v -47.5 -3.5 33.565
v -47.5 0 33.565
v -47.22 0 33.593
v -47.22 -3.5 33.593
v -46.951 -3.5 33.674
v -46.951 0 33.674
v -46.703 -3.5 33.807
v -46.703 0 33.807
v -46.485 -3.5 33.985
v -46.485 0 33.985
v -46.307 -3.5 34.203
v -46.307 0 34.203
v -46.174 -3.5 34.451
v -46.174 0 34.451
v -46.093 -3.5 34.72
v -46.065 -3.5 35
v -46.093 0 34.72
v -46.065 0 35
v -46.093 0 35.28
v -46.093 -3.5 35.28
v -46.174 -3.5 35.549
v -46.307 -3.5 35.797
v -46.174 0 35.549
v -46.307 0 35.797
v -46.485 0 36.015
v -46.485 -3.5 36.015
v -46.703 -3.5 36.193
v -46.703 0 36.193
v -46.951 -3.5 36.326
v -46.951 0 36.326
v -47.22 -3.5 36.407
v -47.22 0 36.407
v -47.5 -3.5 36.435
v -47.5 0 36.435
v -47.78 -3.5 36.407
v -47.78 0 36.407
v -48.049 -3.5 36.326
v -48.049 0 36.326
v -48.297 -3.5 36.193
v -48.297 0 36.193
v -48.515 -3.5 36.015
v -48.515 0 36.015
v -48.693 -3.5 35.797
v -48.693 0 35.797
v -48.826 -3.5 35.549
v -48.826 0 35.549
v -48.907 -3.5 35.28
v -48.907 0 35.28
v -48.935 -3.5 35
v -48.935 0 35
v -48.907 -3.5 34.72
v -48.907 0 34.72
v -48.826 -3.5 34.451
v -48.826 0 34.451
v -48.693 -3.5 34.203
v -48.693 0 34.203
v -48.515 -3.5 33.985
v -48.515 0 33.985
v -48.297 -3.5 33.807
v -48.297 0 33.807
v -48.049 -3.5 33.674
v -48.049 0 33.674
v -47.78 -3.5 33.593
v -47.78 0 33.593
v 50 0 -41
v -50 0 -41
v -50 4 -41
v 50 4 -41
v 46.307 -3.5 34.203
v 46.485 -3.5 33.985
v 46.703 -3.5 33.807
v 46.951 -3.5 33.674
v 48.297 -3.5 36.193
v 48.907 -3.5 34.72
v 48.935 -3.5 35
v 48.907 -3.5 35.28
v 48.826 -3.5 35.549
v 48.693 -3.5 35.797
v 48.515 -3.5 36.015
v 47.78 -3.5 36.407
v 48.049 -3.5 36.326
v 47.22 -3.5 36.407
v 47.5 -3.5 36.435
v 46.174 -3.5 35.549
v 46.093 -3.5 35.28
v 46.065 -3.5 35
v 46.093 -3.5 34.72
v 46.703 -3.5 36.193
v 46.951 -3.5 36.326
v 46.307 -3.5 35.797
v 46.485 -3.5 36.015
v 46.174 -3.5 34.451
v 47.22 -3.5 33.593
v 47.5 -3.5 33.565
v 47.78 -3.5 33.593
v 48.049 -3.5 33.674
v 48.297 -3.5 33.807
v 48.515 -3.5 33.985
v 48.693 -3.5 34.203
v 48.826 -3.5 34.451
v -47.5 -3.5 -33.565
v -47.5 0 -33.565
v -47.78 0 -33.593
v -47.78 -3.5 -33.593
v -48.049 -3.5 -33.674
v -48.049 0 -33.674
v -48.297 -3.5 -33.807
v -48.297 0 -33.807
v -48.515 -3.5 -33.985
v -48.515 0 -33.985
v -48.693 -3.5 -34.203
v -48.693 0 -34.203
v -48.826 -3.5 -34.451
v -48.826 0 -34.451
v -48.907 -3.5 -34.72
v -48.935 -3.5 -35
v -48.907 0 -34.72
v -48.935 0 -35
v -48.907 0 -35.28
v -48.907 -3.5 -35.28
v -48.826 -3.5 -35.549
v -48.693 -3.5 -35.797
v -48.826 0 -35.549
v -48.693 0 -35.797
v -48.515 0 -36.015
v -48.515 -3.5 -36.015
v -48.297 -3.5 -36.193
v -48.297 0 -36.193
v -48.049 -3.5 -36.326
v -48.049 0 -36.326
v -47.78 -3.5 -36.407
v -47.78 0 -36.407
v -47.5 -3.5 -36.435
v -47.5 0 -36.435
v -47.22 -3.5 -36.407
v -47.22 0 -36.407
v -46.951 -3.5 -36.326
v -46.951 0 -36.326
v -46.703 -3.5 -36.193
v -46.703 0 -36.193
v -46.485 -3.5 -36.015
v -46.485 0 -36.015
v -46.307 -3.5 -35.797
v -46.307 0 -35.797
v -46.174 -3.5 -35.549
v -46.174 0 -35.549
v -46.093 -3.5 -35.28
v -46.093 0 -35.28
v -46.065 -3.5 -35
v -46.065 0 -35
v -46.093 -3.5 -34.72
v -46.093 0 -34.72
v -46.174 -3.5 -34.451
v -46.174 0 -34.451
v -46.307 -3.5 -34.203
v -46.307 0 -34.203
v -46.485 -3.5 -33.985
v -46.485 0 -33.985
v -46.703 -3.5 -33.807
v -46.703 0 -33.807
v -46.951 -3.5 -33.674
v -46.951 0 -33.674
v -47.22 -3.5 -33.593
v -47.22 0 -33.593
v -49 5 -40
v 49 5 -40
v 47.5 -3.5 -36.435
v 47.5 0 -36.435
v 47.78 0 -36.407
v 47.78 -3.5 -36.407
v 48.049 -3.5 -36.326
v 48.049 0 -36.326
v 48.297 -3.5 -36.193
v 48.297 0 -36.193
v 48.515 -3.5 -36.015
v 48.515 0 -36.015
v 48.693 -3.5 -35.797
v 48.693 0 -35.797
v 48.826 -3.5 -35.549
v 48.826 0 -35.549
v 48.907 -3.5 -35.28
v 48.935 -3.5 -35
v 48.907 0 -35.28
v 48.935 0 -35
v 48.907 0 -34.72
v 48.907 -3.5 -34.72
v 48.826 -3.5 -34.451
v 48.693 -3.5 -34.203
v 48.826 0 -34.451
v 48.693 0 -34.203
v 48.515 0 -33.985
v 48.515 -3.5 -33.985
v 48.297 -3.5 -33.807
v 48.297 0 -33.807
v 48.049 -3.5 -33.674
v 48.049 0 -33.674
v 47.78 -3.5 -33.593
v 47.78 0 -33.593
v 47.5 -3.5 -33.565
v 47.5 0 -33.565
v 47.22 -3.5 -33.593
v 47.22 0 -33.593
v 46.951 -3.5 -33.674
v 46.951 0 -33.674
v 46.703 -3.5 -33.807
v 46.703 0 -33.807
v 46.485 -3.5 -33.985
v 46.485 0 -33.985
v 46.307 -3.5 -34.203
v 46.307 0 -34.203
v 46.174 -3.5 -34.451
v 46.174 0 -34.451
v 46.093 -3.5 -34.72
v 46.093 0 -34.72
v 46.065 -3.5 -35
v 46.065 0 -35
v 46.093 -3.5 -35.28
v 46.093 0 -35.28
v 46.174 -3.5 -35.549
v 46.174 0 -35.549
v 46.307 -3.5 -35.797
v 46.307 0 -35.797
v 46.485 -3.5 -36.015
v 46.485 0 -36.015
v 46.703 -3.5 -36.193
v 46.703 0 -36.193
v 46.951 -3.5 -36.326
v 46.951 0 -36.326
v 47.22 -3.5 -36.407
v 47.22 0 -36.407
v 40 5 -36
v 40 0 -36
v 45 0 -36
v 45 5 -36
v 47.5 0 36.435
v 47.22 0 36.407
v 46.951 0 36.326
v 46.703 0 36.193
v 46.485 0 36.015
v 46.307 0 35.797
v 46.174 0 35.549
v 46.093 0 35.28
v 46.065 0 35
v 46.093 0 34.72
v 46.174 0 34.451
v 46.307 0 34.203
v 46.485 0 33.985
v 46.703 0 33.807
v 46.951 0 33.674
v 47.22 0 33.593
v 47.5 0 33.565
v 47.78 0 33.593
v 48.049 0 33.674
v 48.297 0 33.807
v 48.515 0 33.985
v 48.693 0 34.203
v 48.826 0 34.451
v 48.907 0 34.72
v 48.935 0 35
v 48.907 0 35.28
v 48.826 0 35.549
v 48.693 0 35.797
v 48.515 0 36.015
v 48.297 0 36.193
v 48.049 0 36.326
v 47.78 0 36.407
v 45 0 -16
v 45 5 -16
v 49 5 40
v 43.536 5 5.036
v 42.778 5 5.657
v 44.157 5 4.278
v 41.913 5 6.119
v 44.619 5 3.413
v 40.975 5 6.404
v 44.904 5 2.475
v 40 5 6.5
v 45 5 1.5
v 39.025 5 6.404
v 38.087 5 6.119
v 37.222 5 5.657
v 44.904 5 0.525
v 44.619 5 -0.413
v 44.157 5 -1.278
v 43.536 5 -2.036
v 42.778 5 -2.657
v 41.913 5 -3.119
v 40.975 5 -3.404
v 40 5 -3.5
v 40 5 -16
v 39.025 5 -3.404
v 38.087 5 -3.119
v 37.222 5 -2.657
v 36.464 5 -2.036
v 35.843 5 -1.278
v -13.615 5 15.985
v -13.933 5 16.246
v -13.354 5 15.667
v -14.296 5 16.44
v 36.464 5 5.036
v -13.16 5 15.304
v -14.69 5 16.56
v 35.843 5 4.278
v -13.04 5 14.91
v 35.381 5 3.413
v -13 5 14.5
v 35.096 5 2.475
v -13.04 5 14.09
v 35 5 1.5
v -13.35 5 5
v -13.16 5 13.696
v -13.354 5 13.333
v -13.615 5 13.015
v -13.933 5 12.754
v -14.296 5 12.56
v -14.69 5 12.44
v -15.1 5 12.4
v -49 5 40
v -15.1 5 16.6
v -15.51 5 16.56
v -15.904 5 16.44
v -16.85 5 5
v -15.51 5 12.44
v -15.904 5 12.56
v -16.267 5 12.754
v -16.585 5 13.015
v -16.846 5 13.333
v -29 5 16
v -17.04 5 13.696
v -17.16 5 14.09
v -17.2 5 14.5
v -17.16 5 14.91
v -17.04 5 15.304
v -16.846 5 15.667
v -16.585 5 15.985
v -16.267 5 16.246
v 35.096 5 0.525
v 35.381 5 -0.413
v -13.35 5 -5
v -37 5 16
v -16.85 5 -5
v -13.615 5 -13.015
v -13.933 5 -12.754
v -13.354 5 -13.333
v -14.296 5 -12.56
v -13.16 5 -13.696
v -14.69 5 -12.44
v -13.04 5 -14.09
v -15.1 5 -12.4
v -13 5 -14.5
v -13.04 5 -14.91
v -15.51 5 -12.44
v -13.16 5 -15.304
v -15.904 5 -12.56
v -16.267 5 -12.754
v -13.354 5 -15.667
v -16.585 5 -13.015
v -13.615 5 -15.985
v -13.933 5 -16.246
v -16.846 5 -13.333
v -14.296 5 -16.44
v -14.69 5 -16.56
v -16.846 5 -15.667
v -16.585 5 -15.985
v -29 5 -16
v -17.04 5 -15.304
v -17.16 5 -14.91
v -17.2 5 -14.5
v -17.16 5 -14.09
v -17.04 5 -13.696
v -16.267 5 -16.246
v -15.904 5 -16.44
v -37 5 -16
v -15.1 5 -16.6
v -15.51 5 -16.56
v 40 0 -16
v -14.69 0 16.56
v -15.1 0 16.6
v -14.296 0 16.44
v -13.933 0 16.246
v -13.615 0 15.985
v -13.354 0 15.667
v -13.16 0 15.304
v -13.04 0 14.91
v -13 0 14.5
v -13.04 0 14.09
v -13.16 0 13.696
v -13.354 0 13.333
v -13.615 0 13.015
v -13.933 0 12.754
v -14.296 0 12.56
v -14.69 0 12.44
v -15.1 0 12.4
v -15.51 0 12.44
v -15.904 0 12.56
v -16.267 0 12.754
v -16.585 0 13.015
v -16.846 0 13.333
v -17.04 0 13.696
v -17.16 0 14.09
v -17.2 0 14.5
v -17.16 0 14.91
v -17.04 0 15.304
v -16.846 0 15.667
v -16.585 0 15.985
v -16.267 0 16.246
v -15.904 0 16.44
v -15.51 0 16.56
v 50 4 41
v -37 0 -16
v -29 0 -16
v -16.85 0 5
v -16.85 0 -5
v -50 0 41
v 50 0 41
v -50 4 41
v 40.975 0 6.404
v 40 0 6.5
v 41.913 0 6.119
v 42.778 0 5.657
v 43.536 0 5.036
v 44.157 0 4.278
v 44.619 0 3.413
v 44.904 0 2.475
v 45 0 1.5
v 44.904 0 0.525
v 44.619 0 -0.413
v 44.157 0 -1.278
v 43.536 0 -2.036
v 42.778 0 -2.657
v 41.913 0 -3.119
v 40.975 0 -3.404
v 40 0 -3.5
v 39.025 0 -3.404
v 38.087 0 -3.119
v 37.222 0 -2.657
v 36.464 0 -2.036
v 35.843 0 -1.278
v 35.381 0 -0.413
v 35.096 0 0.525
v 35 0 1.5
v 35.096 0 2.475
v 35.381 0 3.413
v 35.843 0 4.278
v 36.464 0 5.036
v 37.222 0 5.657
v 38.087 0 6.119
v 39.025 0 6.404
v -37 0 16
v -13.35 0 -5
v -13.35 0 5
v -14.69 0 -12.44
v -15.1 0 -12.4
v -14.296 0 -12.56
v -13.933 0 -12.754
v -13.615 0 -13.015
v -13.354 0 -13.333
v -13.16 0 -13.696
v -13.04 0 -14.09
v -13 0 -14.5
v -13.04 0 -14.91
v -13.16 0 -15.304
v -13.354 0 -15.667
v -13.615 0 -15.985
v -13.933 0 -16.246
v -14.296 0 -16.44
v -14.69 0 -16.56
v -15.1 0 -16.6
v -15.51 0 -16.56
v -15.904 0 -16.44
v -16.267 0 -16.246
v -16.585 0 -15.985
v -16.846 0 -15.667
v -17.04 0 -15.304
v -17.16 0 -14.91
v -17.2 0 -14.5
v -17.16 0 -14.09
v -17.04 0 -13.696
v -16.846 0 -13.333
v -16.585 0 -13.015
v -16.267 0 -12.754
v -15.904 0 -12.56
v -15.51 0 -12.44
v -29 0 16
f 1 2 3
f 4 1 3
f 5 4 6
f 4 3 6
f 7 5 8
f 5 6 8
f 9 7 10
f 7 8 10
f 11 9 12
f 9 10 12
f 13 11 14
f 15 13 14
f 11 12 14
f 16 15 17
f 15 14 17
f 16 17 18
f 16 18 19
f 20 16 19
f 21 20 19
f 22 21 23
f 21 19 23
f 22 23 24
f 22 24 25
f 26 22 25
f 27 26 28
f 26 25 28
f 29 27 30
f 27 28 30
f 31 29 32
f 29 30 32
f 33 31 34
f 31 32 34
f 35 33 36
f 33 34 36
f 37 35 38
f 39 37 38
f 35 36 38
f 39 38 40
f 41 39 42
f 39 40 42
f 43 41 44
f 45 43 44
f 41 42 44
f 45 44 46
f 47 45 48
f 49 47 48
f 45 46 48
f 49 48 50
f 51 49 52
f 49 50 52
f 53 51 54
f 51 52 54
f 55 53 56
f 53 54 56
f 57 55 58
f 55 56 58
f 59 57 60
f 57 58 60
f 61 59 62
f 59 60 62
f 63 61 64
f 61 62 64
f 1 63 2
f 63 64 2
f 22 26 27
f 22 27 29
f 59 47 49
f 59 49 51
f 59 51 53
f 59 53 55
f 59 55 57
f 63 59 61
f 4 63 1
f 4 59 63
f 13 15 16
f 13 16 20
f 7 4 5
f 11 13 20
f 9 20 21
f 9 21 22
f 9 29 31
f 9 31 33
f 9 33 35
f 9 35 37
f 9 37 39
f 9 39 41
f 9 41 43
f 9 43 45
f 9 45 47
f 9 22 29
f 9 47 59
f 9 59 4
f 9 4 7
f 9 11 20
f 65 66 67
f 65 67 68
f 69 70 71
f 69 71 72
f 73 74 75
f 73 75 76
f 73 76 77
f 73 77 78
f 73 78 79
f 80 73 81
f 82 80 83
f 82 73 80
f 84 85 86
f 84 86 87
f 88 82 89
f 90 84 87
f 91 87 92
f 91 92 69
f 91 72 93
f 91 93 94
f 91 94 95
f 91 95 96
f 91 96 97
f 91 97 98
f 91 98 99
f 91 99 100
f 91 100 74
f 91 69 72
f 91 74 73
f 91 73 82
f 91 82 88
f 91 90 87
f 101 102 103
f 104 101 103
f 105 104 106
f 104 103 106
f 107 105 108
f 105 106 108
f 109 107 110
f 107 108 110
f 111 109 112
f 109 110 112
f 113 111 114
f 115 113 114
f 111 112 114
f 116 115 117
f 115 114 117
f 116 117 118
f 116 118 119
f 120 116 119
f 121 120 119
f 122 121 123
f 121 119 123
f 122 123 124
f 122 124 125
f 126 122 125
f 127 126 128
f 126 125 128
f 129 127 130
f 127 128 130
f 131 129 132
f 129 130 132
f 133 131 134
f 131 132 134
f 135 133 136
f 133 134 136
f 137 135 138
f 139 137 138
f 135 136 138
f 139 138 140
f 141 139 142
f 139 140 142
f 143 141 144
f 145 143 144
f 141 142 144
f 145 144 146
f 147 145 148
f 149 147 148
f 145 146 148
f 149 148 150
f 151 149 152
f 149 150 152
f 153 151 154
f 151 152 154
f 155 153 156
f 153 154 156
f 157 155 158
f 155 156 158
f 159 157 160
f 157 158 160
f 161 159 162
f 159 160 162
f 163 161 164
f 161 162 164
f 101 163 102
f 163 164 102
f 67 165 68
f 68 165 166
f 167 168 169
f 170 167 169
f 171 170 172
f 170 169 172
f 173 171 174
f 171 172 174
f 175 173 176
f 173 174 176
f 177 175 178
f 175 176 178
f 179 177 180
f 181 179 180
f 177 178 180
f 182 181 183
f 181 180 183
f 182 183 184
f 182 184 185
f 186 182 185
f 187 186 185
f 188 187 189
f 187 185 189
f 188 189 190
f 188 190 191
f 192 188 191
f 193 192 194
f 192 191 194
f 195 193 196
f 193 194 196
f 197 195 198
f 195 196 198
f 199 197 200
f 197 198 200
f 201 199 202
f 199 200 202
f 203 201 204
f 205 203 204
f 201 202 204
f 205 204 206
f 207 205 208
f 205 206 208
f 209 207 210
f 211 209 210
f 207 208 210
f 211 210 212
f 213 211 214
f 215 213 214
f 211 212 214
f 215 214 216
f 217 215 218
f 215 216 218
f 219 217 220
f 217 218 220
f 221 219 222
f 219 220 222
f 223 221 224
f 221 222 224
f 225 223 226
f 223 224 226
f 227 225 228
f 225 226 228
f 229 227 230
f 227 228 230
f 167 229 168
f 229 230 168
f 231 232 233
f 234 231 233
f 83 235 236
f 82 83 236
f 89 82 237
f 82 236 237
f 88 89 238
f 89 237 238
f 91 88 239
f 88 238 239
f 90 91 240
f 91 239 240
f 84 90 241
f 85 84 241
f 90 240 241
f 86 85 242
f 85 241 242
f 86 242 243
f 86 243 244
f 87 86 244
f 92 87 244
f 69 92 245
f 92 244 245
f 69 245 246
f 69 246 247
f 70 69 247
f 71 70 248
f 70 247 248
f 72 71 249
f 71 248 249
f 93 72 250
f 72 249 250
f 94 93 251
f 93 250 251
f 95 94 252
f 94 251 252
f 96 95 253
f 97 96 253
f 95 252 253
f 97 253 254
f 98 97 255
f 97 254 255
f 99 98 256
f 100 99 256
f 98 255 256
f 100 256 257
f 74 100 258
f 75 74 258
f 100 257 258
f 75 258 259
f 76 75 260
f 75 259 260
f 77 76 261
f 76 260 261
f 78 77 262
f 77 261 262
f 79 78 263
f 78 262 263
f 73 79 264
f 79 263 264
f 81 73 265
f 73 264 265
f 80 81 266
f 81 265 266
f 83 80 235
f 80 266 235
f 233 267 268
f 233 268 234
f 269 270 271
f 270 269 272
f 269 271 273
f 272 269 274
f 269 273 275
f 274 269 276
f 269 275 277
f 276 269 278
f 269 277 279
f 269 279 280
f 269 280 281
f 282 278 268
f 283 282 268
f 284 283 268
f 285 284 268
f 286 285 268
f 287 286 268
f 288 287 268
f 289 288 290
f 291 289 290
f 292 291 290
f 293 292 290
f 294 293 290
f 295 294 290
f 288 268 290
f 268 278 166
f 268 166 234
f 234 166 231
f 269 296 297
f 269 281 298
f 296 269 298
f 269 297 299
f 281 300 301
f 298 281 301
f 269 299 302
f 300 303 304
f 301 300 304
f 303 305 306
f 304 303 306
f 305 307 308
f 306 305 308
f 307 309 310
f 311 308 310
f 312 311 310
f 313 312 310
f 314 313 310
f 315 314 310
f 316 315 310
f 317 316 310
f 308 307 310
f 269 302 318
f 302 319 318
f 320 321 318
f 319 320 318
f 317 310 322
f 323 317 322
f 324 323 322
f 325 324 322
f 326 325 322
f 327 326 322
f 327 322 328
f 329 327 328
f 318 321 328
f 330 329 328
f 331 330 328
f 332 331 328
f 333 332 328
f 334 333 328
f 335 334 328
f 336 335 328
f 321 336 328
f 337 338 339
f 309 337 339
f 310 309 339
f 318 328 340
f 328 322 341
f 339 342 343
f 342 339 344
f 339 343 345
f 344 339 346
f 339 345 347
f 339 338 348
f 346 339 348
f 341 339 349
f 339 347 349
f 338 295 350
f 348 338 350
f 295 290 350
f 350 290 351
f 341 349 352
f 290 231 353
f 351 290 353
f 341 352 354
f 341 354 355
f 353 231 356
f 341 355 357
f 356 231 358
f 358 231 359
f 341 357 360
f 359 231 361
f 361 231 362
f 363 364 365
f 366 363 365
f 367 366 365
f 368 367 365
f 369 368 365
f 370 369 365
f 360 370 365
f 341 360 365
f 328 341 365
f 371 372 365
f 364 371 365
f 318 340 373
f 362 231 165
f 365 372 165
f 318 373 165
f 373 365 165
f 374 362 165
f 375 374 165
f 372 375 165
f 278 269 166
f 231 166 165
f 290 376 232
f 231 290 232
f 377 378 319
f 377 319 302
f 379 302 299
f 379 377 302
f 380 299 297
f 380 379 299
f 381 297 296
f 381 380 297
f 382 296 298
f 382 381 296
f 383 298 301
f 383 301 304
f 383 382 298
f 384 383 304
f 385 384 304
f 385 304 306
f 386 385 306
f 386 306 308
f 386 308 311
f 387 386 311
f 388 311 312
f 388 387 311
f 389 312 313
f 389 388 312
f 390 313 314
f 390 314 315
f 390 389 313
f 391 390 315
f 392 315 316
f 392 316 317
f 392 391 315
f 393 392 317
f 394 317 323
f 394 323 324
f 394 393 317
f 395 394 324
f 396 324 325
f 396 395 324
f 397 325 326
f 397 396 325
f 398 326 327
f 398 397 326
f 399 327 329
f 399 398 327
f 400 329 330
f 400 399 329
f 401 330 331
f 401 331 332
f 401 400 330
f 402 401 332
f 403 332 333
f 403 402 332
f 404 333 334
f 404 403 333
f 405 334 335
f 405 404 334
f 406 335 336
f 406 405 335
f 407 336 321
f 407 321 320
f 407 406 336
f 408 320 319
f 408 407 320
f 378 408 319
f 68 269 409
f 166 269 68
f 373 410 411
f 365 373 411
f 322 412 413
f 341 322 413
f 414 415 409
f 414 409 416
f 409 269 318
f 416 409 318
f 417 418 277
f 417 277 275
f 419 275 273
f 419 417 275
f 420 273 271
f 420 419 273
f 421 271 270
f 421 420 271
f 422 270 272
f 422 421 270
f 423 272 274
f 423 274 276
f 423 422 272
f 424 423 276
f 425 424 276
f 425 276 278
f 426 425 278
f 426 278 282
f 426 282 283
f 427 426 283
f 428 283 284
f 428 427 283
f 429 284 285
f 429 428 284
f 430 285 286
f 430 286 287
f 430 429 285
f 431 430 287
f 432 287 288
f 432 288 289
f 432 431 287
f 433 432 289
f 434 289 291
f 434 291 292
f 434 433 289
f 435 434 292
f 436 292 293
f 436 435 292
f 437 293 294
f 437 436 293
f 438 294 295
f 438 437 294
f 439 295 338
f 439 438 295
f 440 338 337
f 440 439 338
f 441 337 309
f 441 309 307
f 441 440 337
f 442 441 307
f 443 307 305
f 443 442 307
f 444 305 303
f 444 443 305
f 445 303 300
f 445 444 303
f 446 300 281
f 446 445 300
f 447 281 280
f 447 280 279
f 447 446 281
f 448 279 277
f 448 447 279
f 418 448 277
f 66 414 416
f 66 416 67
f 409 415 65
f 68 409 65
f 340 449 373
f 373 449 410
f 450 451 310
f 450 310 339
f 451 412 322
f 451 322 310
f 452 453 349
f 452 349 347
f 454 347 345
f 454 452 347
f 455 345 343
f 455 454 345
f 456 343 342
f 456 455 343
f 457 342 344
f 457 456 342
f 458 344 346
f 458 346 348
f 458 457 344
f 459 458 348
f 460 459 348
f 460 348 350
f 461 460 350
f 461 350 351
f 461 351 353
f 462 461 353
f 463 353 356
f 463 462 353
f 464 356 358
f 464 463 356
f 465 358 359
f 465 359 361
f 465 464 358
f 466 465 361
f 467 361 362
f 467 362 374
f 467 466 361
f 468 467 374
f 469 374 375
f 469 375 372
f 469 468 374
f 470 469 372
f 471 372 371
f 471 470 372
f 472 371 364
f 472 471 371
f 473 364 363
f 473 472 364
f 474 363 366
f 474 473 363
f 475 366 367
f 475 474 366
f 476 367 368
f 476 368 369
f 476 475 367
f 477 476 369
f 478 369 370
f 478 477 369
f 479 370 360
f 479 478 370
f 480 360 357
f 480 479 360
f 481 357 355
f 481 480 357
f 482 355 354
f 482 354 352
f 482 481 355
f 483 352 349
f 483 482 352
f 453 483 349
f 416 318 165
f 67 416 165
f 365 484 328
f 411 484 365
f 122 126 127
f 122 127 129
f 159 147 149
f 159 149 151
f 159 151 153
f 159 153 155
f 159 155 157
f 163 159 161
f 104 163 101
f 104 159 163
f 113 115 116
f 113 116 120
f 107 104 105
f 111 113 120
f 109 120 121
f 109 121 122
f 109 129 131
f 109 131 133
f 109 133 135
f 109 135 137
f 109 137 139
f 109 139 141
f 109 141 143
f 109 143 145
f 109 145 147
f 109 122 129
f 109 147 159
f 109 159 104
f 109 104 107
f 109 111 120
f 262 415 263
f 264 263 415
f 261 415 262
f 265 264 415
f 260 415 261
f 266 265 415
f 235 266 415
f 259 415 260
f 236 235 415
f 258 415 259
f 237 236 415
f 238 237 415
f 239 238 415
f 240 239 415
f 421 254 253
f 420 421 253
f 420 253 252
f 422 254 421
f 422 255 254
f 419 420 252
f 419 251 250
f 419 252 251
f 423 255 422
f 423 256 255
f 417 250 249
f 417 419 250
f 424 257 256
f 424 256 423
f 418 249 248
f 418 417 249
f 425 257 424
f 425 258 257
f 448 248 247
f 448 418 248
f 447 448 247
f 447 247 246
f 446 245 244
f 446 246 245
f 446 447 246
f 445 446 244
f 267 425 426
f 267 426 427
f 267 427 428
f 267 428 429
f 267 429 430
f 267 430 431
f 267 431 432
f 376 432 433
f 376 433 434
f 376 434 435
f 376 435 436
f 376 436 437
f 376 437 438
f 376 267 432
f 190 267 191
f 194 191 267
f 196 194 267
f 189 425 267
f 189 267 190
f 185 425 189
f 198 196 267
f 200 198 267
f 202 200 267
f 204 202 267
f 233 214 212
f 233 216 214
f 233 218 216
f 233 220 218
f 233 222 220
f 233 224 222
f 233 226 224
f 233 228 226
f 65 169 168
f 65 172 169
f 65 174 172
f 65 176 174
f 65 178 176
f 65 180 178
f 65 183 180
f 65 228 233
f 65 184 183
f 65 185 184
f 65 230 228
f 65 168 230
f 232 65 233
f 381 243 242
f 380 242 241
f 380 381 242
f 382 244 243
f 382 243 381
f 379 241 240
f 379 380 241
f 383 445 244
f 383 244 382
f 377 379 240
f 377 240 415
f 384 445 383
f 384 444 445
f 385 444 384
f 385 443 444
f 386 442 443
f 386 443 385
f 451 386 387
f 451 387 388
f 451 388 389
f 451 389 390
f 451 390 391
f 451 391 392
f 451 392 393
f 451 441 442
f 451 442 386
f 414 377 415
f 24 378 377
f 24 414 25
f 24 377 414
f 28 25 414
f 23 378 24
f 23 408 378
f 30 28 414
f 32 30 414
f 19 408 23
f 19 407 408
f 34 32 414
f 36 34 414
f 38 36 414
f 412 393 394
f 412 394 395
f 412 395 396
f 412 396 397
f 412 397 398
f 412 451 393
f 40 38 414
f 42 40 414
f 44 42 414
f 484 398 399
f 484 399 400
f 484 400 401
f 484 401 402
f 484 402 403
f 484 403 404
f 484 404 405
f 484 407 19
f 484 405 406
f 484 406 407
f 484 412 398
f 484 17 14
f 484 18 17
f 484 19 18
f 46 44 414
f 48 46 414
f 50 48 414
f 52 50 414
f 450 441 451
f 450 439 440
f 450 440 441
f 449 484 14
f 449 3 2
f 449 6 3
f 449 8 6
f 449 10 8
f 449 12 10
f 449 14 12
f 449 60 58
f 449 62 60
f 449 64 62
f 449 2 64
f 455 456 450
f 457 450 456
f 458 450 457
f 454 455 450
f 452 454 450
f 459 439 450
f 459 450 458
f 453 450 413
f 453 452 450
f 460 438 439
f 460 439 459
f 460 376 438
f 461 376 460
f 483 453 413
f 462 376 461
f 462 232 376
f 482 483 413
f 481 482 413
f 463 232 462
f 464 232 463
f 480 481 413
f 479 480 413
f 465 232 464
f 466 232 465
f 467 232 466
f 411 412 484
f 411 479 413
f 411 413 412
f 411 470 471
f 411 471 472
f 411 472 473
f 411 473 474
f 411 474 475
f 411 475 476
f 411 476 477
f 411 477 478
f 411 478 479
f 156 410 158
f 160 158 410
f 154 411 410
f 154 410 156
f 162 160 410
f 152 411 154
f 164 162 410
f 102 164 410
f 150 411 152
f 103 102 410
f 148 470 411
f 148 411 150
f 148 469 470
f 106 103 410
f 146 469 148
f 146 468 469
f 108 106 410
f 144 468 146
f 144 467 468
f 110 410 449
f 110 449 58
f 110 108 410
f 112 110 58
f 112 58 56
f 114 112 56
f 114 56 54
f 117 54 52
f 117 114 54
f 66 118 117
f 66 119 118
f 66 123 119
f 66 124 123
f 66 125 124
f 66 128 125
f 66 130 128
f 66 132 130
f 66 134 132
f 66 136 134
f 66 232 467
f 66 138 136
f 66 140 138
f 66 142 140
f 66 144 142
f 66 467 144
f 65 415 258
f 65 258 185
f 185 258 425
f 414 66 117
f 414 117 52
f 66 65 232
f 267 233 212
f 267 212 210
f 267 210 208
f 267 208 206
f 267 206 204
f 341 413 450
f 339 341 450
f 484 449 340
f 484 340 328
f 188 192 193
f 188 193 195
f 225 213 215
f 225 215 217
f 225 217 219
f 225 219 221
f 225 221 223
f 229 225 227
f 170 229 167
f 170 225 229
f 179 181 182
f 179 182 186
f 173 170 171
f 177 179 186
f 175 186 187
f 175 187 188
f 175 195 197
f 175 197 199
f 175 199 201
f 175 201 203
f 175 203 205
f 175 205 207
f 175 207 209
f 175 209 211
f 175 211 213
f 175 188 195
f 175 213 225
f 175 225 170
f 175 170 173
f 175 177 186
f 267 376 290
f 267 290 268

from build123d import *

# Parameters (mm, degrees)
SKETCH1_R           = 5
SKETCH1_R_2         = 2.1
SKETCH1_W           = 5
SKETCH1_H           = 20
SKETCH1_W_2         = 8
SKETCH1_H_2         = 32
SKETCH1_W_3         = 3.5
SKETCH1_H_3         = 10
BOSS_EXTRUDE1_DEPTH = 5
CHAMFER1_SIZE       = 1
SKETCH3_R           = 1.435
BOSS_EXTRUDE2_DEPTH = 3.5


with BuildPart() as part:
    # Sketch1 → Boss-Extrude1 (new body)
    with BuildSketch(Plane(origin=(0, 0, 0), x_dir=(1, 0, 0), z_dir=(0, 1, 0))):
        Polygon((50, 16), (50, -41), (-50, -41), (-50, 41), (50, 41), (50, 36), align=None)
        with Locations(Location((40, -1.5, 0), (0, 0, 270))):
            Circle(SKETCH1_R, mode=Mode.SUBTRACT)
        with Locations(Location((-15.1, 14.5, 0), (0, 0, 270))):
            Circle(SKETCH1_R_2, mode=Mode.SUBTRACT)
        with Locations(Location((-15.1, -14.5, 0), (0, 0, 270))):
            Circle(SKETCH1_R_2, mode=Mode.SUBTRACT)
        with Locations((42.5, 26)):
            Rectangle(SKETCH1_W, SKETCH1_H, mode=Mode.SUBTRACT)
        with Locations((-33, 0)):
            Rectangle(SKETCH1_W_2, SKETCH1_H_2, mode=Mode.SUBTRACT)
        with Locations((-15.1, 0)):
            Rectangle(SKETCH1_W_3, SKETCH1_H_3, mode=Mode.SUBTRACT)
    extrude(amount=BOSS_EXTRUDE1_DEPTH)

    # Chamfer1
    chamfer1_edges = [part.edges().sort_by_distance(p)[0] for p in [
        (50, 5, 0),
        (0, 5, -41),
        (-50, 5, 0),
        (0, 5, 41),
    ]]
    chamfer(chamfer1_edges, length=CHAMFER1_SIZE)

    # Sketch3 → Boss-Extrude2 (add)
    with BuildSketch(Plane.XZ):
        with Locations(Location((47.5, 35, 0), (0, 0, 90))):
            Circle(SKETCH3_R)
        with Locations(Location((-47.5, 35, 0), (0, 0, 270))):
            Circle(SKETCH3_R)
        with Locations(Location((47.5, -35, 0), (0, 0, 270))):
            Circle(SKETCH3_R)
        with Locations(Location((-47.5, -35, 0), (0, 0, 90))):
            Circle(SKETCH3_R)
    extrude(amount=BOSS_EXTRUDE2_DEPTH)


solid = part.part
